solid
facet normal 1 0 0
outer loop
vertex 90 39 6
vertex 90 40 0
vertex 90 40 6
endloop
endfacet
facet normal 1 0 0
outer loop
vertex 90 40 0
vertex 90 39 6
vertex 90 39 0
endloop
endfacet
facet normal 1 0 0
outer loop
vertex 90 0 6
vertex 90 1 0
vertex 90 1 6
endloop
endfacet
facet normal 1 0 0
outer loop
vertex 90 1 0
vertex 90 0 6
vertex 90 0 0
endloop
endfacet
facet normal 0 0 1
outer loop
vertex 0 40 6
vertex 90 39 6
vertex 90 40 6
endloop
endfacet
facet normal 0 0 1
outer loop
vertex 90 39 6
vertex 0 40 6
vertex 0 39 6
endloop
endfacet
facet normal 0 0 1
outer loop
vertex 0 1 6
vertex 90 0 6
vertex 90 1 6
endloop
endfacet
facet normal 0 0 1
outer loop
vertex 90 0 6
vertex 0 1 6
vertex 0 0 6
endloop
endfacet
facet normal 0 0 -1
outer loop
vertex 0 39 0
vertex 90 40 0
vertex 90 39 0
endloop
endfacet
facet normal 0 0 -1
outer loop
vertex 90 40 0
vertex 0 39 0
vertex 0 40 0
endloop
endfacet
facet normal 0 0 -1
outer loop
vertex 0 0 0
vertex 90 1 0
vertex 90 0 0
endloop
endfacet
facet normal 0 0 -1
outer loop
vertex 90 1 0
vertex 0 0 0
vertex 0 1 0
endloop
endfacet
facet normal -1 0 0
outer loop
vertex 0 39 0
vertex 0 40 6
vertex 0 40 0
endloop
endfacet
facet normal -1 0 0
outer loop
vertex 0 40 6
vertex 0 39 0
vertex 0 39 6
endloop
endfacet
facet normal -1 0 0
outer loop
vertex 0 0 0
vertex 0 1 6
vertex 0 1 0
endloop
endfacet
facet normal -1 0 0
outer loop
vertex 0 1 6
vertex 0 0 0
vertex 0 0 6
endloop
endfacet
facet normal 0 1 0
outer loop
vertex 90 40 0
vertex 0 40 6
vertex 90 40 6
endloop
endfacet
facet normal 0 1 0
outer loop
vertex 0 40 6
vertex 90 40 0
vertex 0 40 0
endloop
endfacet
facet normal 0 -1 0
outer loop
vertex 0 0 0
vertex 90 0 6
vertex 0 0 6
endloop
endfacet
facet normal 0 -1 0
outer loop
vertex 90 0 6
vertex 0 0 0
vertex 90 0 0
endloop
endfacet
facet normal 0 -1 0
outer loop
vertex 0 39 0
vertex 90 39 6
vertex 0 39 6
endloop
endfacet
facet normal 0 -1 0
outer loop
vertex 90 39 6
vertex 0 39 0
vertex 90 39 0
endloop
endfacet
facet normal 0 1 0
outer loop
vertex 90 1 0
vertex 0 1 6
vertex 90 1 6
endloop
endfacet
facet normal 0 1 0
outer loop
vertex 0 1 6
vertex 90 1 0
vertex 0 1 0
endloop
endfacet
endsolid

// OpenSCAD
base_len = 90;
base_wid = 40;
base_thk = 6;

riser_h = 35;
riser_thk = 8;
riser_wid = 30;
riser_offset_x = 15;
riser_backset = 0;

hole_d = 4.5;
hole_edge_x = 12;
hole_edge_y = 10;
hole_spacing_x = 60;

fastener_clearance = 8;

module base_plate() {
difference() {
cube([base_len, base_wid, base_thk], center=false);
for (x = [hole_edge_x, hole_edge_x + hole_spacing_x]) {
translate([x, hole_edge_y, -1])
cylinder(d=hole_d, h=base_thk + 2, $fn=48);
}
}
}

module riser_block() {
translate([riser_offset_x, (base_wid - riser_wid)/2, base_thk])
cube([riser_thk, riser_wid, riser_h], center=false);
}

module fastener_access_volume() {
translate([0, (base_wid - (riser_wid + fastener_clearance))/2, 0])
cube([base_len, riser_wid + fastener_clearance, base_thk + riser_h], center=false);
}

module mount() {
difference() {
union() {
base_plate();
riser_block();
}
fastener_access_volume();
}
}

module fit_check() {
union() {
base_plate();
translate([riser_offset_x, (base_wid - riser_wid)/2, base_thk])
cube([riser_thk, riser_wid, fit_check_thk], center=false);
}
}

// Render full part
mount();

// Uncomment for printable fit-check slice
// fit_check();
